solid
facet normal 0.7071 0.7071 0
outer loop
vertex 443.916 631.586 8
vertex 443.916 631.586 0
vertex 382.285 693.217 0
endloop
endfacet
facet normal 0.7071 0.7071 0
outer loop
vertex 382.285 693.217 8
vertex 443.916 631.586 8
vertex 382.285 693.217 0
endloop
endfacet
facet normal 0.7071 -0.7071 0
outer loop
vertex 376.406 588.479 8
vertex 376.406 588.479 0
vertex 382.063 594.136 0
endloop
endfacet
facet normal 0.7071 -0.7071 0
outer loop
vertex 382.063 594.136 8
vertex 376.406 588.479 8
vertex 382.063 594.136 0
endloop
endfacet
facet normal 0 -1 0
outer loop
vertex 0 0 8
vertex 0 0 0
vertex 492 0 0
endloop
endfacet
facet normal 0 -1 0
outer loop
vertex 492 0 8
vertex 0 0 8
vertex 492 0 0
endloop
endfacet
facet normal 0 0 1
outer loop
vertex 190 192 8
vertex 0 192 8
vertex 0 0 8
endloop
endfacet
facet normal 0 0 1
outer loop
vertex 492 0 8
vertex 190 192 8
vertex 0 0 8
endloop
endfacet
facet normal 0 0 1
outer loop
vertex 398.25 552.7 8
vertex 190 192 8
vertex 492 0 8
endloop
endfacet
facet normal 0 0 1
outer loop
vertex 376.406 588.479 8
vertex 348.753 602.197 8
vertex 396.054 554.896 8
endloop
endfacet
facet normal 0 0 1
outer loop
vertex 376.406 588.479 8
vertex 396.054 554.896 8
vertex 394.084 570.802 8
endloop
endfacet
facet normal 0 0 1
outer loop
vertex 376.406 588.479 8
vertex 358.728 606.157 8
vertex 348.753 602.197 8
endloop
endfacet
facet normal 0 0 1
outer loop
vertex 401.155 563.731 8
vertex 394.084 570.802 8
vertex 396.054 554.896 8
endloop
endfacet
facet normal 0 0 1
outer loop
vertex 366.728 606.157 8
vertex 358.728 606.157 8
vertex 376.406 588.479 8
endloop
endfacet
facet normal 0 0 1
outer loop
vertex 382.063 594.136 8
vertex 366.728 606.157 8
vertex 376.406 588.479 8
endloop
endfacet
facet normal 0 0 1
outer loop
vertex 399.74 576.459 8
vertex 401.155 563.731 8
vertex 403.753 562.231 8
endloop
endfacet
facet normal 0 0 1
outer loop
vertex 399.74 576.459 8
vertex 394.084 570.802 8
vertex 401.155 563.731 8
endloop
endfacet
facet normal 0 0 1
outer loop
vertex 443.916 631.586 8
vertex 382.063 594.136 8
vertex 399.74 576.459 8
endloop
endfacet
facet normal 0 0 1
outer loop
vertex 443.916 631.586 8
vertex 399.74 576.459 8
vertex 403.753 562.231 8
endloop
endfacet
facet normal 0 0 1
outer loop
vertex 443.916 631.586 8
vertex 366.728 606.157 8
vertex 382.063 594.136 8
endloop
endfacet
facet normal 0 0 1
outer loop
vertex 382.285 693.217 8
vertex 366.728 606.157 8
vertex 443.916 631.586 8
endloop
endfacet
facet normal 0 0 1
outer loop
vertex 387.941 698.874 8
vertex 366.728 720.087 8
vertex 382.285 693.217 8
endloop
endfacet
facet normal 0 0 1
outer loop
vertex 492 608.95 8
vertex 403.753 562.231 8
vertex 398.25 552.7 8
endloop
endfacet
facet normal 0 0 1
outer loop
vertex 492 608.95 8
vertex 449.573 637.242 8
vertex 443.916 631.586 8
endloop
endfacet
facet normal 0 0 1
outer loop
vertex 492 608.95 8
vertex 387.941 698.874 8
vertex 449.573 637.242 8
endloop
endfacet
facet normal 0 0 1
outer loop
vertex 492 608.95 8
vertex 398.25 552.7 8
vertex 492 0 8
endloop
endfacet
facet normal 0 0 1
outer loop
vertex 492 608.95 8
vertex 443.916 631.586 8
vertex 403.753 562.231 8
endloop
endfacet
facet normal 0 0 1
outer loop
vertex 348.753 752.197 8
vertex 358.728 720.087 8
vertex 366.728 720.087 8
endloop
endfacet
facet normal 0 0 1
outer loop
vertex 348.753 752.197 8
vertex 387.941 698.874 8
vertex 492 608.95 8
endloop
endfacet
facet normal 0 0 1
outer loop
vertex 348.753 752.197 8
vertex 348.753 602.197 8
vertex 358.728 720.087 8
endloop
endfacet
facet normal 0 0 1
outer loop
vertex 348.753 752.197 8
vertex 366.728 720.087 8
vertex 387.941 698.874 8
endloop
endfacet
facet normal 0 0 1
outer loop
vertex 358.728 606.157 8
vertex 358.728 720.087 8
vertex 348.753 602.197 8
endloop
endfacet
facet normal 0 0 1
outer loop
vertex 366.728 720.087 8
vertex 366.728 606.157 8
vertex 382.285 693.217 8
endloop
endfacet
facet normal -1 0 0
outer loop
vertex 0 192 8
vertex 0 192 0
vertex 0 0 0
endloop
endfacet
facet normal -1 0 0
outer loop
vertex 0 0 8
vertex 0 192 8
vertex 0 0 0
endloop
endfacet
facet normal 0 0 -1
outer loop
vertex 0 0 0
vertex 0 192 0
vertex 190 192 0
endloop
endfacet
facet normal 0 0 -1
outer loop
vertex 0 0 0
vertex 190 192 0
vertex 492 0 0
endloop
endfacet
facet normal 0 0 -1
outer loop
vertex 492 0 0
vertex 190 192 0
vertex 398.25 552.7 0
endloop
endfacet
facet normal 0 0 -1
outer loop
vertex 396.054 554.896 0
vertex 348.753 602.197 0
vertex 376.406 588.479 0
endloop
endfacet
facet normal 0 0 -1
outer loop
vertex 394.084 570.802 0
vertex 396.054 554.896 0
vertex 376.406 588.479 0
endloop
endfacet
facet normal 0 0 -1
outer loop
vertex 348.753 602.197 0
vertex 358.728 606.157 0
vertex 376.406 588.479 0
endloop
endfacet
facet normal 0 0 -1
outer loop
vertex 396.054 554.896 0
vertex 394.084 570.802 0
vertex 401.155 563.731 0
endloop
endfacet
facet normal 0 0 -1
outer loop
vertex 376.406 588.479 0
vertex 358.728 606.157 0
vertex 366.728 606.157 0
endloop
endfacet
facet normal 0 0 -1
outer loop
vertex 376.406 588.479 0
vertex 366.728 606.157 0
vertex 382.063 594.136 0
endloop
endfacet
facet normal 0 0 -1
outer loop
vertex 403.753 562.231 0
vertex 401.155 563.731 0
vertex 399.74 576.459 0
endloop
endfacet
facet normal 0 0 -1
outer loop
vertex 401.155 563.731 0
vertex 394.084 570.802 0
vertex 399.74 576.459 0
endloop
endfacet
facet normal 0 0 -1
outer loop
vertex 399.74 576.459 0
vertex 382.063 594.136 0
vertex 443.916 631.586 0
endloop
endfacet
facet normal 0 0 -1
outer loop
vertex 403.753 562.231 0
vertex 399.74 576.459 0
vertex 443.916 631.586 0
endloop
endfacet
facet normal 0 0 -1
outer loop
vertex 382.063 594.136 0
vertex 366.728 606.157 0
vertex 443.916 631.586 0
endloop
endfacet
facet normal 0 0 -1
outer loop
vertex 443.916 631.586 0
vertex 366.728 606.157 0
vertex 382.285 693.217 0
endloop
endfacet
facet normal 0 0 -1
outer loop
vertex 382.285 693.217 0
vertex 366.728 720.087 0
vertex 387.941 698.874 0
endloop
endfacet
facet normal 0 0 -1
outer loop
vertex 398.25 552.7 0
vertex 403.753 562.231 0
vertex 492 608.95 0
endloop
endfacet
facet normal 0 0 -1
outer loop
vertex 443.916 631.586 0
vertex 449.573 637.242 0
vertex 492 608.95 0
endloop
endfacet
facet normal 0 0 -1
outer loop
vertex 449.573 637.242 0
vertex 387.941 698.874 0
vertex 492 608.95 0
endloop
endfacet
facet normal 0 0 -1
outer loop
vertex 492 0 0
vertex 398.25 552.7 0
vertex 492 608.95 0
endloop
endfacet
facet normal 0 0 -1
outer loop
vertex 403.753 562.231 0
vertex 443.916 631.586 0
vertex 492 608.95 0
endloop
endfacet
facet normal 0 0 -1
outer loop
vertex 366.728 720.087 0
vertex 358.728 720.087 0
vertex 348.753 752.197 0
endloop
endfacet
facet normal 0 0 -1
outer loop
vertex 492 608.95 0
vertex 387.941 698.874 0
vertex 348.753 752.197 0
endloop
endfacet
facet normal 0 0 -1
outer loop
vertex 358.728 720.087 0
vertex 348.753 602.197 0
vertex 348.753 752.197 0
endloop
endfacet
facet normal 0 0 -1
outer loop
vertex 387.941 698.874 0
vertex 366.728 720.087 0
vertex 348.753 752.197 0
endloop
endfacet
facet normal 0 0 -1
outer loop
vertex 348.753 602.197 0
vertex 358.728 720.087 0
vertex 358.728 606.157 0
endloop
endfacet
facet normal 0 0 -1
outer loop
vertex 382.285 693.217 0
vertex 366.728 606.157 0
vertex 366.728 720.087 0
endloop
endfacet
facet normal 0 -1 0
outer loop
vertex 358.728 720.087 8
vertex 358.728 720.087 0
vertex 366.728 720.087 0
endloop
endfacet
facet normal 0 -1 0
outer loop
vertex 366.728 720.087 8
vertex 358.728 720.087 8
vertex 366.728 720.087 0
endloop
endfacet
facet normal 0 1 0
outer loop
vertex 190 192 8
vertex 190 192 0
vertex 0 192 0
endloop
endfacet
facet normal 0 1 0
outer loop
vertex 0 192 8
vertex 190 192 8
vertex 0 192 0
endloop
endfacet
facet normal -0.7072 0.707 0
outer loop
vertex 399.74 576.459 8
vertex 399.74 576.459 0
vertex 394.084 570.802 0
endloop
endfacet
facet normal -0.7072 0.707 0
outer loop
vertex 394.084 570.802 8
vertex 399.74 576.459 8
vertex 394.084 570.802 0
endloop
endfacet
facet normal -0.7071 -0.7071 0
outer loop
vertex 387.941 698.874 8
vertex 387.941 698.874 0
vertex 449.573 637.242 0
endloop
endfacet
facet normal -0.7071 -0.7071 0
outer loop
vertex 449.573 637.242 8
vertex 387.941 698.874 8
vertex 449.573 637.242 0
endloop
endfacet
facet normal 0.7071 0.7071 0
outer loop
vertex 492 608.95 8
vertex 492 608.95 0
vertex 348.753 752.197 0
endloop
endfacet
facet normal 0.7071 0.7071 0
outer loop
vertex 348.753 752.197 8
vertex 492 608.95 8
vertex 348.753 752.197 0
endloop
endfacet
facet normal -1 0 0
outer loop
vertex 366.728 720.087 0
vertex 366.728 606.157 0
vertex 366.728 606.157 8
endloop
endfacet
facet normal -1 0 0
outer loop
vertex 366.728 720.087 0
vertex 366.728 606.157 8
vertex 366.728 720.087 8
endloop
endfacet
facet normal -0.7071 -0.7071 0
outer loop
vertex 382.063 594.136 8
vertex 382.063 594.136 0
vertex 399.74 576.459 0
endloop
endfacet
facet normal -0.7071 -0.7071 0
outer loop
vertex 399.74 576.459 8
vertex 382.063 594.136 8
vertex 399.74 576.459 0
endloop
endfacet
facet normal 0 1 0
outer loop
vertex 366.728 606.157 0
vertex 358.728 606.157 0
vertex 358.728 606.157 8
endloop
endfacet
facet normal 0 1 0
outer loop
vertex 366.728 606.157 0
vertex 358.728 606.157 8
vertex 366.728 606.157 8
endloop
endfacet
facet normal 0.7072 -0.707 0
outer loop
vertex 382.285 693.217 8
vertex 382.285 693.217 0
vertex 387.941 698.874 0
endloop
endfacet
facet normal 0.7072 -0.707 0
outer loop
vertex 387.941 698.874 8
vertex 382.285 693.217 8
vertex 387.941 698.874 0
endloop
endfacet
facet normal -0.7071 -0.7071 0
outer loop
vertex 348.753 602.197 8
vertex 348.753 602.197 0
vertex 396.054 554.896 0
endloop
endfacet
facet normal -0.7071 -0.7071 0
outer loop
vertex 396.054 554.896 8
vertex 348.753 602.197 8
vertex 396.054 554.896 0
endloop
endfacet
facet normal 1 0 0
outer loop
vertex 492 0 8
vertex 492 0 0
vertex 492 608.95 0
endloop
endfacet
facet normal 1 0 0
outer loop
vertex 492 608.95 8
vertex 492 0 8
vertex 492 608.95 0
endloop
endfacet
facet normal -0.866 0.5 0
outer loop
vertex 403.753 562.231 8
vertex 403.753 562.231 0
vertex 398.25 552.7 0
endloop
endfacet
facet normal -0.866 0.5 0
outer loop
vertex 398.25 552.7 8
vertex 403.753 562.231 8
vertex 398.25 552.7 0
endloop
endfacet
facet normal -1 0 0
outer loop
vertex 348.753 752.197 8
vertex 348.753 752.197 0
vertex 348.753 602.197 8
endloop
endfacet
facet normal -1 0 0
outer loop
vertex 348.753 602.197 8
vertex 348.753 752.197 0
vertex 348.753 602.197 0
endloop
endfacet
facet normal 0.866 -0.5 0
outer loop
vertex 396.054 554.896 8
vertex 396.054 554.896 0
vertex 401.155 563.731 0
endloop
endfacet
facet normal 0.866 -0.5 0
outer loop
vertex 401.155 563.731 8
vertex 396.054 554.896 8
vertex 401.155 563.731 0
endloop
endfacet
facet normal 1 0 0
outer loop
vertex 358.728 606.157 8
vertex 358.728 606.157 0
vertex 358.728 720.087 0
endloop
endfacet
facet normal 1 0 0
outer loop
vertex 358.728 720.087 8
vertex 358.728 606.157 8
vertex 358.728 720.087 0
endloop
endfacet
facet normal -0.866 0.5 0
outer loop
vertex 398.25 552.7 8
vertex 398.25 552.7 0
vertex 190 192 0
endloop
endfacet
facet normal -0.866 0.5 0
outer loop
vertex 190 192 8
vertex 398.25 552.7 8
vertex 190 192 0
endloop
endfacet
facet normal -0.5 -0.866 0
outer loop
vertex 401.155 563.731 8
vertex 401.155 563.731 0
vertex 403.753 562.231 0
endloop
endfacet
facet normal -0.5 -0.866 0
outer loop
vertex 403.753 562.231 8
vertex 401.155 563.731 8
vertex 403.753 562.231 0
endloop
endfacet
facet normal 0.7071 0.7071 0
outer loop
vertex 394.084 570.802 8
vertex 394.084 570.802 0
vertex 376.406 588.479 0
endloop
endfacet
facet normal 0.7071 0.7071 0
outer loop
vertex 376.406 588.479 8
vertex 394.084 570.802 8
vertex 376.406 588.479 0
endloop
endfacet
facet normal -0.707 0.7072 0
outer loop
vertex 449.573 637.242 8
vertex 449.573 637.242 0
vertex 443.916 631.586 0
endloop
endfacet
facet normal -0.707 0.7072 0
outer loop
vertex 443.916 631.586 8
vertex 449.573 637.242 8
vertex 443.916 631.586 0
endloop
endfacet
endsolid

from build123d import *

# Parameters (mm, degrees)
SKETCH1_W           = 8
SKETCH1_H           = 113.93
BOSS_EXTRUDE1_DEPTH = 8


with BuildPart() as part:
    # Sketch1 → Boss-Extrude1 (new body)
    with BuildSketch(Plane.XY):
        Polygon((0, 192), (0, 0), (492, 0), (492, 608.949580676), (348.752525317, 752.197055359), (348.752525317, 602.197055359), (396.053847577, 554.895733099), (401.154700619, 563.730669729), (403.75277683, 562.230669729), (398.25, 552.699580676), (190, 192), align=None)
        with Locations((362.728293748, 663.1220766)):
            Rectangle(SKETCH1_W, SKETCH1_H, mode=Mode.SUBTRACT)
        Polygon((394.083632807, 570.801737541), (376.405963277, 588.479407071), (382.062817527, 594.13626132), (399.740487057, 576.458591791), align=None, mode=Mode.SUBTRACT)
        Polygon((443.916069982, 631.585591867), (382.284642934, 693.217018915), (387.941497183, 698.873873165), (449.572924232, 637.242446117), align=None, mode=Mode.SUBTRACT)
    extrude(amount=BOSS_EXTRUDE1_DEPTH)


solid = part.part
